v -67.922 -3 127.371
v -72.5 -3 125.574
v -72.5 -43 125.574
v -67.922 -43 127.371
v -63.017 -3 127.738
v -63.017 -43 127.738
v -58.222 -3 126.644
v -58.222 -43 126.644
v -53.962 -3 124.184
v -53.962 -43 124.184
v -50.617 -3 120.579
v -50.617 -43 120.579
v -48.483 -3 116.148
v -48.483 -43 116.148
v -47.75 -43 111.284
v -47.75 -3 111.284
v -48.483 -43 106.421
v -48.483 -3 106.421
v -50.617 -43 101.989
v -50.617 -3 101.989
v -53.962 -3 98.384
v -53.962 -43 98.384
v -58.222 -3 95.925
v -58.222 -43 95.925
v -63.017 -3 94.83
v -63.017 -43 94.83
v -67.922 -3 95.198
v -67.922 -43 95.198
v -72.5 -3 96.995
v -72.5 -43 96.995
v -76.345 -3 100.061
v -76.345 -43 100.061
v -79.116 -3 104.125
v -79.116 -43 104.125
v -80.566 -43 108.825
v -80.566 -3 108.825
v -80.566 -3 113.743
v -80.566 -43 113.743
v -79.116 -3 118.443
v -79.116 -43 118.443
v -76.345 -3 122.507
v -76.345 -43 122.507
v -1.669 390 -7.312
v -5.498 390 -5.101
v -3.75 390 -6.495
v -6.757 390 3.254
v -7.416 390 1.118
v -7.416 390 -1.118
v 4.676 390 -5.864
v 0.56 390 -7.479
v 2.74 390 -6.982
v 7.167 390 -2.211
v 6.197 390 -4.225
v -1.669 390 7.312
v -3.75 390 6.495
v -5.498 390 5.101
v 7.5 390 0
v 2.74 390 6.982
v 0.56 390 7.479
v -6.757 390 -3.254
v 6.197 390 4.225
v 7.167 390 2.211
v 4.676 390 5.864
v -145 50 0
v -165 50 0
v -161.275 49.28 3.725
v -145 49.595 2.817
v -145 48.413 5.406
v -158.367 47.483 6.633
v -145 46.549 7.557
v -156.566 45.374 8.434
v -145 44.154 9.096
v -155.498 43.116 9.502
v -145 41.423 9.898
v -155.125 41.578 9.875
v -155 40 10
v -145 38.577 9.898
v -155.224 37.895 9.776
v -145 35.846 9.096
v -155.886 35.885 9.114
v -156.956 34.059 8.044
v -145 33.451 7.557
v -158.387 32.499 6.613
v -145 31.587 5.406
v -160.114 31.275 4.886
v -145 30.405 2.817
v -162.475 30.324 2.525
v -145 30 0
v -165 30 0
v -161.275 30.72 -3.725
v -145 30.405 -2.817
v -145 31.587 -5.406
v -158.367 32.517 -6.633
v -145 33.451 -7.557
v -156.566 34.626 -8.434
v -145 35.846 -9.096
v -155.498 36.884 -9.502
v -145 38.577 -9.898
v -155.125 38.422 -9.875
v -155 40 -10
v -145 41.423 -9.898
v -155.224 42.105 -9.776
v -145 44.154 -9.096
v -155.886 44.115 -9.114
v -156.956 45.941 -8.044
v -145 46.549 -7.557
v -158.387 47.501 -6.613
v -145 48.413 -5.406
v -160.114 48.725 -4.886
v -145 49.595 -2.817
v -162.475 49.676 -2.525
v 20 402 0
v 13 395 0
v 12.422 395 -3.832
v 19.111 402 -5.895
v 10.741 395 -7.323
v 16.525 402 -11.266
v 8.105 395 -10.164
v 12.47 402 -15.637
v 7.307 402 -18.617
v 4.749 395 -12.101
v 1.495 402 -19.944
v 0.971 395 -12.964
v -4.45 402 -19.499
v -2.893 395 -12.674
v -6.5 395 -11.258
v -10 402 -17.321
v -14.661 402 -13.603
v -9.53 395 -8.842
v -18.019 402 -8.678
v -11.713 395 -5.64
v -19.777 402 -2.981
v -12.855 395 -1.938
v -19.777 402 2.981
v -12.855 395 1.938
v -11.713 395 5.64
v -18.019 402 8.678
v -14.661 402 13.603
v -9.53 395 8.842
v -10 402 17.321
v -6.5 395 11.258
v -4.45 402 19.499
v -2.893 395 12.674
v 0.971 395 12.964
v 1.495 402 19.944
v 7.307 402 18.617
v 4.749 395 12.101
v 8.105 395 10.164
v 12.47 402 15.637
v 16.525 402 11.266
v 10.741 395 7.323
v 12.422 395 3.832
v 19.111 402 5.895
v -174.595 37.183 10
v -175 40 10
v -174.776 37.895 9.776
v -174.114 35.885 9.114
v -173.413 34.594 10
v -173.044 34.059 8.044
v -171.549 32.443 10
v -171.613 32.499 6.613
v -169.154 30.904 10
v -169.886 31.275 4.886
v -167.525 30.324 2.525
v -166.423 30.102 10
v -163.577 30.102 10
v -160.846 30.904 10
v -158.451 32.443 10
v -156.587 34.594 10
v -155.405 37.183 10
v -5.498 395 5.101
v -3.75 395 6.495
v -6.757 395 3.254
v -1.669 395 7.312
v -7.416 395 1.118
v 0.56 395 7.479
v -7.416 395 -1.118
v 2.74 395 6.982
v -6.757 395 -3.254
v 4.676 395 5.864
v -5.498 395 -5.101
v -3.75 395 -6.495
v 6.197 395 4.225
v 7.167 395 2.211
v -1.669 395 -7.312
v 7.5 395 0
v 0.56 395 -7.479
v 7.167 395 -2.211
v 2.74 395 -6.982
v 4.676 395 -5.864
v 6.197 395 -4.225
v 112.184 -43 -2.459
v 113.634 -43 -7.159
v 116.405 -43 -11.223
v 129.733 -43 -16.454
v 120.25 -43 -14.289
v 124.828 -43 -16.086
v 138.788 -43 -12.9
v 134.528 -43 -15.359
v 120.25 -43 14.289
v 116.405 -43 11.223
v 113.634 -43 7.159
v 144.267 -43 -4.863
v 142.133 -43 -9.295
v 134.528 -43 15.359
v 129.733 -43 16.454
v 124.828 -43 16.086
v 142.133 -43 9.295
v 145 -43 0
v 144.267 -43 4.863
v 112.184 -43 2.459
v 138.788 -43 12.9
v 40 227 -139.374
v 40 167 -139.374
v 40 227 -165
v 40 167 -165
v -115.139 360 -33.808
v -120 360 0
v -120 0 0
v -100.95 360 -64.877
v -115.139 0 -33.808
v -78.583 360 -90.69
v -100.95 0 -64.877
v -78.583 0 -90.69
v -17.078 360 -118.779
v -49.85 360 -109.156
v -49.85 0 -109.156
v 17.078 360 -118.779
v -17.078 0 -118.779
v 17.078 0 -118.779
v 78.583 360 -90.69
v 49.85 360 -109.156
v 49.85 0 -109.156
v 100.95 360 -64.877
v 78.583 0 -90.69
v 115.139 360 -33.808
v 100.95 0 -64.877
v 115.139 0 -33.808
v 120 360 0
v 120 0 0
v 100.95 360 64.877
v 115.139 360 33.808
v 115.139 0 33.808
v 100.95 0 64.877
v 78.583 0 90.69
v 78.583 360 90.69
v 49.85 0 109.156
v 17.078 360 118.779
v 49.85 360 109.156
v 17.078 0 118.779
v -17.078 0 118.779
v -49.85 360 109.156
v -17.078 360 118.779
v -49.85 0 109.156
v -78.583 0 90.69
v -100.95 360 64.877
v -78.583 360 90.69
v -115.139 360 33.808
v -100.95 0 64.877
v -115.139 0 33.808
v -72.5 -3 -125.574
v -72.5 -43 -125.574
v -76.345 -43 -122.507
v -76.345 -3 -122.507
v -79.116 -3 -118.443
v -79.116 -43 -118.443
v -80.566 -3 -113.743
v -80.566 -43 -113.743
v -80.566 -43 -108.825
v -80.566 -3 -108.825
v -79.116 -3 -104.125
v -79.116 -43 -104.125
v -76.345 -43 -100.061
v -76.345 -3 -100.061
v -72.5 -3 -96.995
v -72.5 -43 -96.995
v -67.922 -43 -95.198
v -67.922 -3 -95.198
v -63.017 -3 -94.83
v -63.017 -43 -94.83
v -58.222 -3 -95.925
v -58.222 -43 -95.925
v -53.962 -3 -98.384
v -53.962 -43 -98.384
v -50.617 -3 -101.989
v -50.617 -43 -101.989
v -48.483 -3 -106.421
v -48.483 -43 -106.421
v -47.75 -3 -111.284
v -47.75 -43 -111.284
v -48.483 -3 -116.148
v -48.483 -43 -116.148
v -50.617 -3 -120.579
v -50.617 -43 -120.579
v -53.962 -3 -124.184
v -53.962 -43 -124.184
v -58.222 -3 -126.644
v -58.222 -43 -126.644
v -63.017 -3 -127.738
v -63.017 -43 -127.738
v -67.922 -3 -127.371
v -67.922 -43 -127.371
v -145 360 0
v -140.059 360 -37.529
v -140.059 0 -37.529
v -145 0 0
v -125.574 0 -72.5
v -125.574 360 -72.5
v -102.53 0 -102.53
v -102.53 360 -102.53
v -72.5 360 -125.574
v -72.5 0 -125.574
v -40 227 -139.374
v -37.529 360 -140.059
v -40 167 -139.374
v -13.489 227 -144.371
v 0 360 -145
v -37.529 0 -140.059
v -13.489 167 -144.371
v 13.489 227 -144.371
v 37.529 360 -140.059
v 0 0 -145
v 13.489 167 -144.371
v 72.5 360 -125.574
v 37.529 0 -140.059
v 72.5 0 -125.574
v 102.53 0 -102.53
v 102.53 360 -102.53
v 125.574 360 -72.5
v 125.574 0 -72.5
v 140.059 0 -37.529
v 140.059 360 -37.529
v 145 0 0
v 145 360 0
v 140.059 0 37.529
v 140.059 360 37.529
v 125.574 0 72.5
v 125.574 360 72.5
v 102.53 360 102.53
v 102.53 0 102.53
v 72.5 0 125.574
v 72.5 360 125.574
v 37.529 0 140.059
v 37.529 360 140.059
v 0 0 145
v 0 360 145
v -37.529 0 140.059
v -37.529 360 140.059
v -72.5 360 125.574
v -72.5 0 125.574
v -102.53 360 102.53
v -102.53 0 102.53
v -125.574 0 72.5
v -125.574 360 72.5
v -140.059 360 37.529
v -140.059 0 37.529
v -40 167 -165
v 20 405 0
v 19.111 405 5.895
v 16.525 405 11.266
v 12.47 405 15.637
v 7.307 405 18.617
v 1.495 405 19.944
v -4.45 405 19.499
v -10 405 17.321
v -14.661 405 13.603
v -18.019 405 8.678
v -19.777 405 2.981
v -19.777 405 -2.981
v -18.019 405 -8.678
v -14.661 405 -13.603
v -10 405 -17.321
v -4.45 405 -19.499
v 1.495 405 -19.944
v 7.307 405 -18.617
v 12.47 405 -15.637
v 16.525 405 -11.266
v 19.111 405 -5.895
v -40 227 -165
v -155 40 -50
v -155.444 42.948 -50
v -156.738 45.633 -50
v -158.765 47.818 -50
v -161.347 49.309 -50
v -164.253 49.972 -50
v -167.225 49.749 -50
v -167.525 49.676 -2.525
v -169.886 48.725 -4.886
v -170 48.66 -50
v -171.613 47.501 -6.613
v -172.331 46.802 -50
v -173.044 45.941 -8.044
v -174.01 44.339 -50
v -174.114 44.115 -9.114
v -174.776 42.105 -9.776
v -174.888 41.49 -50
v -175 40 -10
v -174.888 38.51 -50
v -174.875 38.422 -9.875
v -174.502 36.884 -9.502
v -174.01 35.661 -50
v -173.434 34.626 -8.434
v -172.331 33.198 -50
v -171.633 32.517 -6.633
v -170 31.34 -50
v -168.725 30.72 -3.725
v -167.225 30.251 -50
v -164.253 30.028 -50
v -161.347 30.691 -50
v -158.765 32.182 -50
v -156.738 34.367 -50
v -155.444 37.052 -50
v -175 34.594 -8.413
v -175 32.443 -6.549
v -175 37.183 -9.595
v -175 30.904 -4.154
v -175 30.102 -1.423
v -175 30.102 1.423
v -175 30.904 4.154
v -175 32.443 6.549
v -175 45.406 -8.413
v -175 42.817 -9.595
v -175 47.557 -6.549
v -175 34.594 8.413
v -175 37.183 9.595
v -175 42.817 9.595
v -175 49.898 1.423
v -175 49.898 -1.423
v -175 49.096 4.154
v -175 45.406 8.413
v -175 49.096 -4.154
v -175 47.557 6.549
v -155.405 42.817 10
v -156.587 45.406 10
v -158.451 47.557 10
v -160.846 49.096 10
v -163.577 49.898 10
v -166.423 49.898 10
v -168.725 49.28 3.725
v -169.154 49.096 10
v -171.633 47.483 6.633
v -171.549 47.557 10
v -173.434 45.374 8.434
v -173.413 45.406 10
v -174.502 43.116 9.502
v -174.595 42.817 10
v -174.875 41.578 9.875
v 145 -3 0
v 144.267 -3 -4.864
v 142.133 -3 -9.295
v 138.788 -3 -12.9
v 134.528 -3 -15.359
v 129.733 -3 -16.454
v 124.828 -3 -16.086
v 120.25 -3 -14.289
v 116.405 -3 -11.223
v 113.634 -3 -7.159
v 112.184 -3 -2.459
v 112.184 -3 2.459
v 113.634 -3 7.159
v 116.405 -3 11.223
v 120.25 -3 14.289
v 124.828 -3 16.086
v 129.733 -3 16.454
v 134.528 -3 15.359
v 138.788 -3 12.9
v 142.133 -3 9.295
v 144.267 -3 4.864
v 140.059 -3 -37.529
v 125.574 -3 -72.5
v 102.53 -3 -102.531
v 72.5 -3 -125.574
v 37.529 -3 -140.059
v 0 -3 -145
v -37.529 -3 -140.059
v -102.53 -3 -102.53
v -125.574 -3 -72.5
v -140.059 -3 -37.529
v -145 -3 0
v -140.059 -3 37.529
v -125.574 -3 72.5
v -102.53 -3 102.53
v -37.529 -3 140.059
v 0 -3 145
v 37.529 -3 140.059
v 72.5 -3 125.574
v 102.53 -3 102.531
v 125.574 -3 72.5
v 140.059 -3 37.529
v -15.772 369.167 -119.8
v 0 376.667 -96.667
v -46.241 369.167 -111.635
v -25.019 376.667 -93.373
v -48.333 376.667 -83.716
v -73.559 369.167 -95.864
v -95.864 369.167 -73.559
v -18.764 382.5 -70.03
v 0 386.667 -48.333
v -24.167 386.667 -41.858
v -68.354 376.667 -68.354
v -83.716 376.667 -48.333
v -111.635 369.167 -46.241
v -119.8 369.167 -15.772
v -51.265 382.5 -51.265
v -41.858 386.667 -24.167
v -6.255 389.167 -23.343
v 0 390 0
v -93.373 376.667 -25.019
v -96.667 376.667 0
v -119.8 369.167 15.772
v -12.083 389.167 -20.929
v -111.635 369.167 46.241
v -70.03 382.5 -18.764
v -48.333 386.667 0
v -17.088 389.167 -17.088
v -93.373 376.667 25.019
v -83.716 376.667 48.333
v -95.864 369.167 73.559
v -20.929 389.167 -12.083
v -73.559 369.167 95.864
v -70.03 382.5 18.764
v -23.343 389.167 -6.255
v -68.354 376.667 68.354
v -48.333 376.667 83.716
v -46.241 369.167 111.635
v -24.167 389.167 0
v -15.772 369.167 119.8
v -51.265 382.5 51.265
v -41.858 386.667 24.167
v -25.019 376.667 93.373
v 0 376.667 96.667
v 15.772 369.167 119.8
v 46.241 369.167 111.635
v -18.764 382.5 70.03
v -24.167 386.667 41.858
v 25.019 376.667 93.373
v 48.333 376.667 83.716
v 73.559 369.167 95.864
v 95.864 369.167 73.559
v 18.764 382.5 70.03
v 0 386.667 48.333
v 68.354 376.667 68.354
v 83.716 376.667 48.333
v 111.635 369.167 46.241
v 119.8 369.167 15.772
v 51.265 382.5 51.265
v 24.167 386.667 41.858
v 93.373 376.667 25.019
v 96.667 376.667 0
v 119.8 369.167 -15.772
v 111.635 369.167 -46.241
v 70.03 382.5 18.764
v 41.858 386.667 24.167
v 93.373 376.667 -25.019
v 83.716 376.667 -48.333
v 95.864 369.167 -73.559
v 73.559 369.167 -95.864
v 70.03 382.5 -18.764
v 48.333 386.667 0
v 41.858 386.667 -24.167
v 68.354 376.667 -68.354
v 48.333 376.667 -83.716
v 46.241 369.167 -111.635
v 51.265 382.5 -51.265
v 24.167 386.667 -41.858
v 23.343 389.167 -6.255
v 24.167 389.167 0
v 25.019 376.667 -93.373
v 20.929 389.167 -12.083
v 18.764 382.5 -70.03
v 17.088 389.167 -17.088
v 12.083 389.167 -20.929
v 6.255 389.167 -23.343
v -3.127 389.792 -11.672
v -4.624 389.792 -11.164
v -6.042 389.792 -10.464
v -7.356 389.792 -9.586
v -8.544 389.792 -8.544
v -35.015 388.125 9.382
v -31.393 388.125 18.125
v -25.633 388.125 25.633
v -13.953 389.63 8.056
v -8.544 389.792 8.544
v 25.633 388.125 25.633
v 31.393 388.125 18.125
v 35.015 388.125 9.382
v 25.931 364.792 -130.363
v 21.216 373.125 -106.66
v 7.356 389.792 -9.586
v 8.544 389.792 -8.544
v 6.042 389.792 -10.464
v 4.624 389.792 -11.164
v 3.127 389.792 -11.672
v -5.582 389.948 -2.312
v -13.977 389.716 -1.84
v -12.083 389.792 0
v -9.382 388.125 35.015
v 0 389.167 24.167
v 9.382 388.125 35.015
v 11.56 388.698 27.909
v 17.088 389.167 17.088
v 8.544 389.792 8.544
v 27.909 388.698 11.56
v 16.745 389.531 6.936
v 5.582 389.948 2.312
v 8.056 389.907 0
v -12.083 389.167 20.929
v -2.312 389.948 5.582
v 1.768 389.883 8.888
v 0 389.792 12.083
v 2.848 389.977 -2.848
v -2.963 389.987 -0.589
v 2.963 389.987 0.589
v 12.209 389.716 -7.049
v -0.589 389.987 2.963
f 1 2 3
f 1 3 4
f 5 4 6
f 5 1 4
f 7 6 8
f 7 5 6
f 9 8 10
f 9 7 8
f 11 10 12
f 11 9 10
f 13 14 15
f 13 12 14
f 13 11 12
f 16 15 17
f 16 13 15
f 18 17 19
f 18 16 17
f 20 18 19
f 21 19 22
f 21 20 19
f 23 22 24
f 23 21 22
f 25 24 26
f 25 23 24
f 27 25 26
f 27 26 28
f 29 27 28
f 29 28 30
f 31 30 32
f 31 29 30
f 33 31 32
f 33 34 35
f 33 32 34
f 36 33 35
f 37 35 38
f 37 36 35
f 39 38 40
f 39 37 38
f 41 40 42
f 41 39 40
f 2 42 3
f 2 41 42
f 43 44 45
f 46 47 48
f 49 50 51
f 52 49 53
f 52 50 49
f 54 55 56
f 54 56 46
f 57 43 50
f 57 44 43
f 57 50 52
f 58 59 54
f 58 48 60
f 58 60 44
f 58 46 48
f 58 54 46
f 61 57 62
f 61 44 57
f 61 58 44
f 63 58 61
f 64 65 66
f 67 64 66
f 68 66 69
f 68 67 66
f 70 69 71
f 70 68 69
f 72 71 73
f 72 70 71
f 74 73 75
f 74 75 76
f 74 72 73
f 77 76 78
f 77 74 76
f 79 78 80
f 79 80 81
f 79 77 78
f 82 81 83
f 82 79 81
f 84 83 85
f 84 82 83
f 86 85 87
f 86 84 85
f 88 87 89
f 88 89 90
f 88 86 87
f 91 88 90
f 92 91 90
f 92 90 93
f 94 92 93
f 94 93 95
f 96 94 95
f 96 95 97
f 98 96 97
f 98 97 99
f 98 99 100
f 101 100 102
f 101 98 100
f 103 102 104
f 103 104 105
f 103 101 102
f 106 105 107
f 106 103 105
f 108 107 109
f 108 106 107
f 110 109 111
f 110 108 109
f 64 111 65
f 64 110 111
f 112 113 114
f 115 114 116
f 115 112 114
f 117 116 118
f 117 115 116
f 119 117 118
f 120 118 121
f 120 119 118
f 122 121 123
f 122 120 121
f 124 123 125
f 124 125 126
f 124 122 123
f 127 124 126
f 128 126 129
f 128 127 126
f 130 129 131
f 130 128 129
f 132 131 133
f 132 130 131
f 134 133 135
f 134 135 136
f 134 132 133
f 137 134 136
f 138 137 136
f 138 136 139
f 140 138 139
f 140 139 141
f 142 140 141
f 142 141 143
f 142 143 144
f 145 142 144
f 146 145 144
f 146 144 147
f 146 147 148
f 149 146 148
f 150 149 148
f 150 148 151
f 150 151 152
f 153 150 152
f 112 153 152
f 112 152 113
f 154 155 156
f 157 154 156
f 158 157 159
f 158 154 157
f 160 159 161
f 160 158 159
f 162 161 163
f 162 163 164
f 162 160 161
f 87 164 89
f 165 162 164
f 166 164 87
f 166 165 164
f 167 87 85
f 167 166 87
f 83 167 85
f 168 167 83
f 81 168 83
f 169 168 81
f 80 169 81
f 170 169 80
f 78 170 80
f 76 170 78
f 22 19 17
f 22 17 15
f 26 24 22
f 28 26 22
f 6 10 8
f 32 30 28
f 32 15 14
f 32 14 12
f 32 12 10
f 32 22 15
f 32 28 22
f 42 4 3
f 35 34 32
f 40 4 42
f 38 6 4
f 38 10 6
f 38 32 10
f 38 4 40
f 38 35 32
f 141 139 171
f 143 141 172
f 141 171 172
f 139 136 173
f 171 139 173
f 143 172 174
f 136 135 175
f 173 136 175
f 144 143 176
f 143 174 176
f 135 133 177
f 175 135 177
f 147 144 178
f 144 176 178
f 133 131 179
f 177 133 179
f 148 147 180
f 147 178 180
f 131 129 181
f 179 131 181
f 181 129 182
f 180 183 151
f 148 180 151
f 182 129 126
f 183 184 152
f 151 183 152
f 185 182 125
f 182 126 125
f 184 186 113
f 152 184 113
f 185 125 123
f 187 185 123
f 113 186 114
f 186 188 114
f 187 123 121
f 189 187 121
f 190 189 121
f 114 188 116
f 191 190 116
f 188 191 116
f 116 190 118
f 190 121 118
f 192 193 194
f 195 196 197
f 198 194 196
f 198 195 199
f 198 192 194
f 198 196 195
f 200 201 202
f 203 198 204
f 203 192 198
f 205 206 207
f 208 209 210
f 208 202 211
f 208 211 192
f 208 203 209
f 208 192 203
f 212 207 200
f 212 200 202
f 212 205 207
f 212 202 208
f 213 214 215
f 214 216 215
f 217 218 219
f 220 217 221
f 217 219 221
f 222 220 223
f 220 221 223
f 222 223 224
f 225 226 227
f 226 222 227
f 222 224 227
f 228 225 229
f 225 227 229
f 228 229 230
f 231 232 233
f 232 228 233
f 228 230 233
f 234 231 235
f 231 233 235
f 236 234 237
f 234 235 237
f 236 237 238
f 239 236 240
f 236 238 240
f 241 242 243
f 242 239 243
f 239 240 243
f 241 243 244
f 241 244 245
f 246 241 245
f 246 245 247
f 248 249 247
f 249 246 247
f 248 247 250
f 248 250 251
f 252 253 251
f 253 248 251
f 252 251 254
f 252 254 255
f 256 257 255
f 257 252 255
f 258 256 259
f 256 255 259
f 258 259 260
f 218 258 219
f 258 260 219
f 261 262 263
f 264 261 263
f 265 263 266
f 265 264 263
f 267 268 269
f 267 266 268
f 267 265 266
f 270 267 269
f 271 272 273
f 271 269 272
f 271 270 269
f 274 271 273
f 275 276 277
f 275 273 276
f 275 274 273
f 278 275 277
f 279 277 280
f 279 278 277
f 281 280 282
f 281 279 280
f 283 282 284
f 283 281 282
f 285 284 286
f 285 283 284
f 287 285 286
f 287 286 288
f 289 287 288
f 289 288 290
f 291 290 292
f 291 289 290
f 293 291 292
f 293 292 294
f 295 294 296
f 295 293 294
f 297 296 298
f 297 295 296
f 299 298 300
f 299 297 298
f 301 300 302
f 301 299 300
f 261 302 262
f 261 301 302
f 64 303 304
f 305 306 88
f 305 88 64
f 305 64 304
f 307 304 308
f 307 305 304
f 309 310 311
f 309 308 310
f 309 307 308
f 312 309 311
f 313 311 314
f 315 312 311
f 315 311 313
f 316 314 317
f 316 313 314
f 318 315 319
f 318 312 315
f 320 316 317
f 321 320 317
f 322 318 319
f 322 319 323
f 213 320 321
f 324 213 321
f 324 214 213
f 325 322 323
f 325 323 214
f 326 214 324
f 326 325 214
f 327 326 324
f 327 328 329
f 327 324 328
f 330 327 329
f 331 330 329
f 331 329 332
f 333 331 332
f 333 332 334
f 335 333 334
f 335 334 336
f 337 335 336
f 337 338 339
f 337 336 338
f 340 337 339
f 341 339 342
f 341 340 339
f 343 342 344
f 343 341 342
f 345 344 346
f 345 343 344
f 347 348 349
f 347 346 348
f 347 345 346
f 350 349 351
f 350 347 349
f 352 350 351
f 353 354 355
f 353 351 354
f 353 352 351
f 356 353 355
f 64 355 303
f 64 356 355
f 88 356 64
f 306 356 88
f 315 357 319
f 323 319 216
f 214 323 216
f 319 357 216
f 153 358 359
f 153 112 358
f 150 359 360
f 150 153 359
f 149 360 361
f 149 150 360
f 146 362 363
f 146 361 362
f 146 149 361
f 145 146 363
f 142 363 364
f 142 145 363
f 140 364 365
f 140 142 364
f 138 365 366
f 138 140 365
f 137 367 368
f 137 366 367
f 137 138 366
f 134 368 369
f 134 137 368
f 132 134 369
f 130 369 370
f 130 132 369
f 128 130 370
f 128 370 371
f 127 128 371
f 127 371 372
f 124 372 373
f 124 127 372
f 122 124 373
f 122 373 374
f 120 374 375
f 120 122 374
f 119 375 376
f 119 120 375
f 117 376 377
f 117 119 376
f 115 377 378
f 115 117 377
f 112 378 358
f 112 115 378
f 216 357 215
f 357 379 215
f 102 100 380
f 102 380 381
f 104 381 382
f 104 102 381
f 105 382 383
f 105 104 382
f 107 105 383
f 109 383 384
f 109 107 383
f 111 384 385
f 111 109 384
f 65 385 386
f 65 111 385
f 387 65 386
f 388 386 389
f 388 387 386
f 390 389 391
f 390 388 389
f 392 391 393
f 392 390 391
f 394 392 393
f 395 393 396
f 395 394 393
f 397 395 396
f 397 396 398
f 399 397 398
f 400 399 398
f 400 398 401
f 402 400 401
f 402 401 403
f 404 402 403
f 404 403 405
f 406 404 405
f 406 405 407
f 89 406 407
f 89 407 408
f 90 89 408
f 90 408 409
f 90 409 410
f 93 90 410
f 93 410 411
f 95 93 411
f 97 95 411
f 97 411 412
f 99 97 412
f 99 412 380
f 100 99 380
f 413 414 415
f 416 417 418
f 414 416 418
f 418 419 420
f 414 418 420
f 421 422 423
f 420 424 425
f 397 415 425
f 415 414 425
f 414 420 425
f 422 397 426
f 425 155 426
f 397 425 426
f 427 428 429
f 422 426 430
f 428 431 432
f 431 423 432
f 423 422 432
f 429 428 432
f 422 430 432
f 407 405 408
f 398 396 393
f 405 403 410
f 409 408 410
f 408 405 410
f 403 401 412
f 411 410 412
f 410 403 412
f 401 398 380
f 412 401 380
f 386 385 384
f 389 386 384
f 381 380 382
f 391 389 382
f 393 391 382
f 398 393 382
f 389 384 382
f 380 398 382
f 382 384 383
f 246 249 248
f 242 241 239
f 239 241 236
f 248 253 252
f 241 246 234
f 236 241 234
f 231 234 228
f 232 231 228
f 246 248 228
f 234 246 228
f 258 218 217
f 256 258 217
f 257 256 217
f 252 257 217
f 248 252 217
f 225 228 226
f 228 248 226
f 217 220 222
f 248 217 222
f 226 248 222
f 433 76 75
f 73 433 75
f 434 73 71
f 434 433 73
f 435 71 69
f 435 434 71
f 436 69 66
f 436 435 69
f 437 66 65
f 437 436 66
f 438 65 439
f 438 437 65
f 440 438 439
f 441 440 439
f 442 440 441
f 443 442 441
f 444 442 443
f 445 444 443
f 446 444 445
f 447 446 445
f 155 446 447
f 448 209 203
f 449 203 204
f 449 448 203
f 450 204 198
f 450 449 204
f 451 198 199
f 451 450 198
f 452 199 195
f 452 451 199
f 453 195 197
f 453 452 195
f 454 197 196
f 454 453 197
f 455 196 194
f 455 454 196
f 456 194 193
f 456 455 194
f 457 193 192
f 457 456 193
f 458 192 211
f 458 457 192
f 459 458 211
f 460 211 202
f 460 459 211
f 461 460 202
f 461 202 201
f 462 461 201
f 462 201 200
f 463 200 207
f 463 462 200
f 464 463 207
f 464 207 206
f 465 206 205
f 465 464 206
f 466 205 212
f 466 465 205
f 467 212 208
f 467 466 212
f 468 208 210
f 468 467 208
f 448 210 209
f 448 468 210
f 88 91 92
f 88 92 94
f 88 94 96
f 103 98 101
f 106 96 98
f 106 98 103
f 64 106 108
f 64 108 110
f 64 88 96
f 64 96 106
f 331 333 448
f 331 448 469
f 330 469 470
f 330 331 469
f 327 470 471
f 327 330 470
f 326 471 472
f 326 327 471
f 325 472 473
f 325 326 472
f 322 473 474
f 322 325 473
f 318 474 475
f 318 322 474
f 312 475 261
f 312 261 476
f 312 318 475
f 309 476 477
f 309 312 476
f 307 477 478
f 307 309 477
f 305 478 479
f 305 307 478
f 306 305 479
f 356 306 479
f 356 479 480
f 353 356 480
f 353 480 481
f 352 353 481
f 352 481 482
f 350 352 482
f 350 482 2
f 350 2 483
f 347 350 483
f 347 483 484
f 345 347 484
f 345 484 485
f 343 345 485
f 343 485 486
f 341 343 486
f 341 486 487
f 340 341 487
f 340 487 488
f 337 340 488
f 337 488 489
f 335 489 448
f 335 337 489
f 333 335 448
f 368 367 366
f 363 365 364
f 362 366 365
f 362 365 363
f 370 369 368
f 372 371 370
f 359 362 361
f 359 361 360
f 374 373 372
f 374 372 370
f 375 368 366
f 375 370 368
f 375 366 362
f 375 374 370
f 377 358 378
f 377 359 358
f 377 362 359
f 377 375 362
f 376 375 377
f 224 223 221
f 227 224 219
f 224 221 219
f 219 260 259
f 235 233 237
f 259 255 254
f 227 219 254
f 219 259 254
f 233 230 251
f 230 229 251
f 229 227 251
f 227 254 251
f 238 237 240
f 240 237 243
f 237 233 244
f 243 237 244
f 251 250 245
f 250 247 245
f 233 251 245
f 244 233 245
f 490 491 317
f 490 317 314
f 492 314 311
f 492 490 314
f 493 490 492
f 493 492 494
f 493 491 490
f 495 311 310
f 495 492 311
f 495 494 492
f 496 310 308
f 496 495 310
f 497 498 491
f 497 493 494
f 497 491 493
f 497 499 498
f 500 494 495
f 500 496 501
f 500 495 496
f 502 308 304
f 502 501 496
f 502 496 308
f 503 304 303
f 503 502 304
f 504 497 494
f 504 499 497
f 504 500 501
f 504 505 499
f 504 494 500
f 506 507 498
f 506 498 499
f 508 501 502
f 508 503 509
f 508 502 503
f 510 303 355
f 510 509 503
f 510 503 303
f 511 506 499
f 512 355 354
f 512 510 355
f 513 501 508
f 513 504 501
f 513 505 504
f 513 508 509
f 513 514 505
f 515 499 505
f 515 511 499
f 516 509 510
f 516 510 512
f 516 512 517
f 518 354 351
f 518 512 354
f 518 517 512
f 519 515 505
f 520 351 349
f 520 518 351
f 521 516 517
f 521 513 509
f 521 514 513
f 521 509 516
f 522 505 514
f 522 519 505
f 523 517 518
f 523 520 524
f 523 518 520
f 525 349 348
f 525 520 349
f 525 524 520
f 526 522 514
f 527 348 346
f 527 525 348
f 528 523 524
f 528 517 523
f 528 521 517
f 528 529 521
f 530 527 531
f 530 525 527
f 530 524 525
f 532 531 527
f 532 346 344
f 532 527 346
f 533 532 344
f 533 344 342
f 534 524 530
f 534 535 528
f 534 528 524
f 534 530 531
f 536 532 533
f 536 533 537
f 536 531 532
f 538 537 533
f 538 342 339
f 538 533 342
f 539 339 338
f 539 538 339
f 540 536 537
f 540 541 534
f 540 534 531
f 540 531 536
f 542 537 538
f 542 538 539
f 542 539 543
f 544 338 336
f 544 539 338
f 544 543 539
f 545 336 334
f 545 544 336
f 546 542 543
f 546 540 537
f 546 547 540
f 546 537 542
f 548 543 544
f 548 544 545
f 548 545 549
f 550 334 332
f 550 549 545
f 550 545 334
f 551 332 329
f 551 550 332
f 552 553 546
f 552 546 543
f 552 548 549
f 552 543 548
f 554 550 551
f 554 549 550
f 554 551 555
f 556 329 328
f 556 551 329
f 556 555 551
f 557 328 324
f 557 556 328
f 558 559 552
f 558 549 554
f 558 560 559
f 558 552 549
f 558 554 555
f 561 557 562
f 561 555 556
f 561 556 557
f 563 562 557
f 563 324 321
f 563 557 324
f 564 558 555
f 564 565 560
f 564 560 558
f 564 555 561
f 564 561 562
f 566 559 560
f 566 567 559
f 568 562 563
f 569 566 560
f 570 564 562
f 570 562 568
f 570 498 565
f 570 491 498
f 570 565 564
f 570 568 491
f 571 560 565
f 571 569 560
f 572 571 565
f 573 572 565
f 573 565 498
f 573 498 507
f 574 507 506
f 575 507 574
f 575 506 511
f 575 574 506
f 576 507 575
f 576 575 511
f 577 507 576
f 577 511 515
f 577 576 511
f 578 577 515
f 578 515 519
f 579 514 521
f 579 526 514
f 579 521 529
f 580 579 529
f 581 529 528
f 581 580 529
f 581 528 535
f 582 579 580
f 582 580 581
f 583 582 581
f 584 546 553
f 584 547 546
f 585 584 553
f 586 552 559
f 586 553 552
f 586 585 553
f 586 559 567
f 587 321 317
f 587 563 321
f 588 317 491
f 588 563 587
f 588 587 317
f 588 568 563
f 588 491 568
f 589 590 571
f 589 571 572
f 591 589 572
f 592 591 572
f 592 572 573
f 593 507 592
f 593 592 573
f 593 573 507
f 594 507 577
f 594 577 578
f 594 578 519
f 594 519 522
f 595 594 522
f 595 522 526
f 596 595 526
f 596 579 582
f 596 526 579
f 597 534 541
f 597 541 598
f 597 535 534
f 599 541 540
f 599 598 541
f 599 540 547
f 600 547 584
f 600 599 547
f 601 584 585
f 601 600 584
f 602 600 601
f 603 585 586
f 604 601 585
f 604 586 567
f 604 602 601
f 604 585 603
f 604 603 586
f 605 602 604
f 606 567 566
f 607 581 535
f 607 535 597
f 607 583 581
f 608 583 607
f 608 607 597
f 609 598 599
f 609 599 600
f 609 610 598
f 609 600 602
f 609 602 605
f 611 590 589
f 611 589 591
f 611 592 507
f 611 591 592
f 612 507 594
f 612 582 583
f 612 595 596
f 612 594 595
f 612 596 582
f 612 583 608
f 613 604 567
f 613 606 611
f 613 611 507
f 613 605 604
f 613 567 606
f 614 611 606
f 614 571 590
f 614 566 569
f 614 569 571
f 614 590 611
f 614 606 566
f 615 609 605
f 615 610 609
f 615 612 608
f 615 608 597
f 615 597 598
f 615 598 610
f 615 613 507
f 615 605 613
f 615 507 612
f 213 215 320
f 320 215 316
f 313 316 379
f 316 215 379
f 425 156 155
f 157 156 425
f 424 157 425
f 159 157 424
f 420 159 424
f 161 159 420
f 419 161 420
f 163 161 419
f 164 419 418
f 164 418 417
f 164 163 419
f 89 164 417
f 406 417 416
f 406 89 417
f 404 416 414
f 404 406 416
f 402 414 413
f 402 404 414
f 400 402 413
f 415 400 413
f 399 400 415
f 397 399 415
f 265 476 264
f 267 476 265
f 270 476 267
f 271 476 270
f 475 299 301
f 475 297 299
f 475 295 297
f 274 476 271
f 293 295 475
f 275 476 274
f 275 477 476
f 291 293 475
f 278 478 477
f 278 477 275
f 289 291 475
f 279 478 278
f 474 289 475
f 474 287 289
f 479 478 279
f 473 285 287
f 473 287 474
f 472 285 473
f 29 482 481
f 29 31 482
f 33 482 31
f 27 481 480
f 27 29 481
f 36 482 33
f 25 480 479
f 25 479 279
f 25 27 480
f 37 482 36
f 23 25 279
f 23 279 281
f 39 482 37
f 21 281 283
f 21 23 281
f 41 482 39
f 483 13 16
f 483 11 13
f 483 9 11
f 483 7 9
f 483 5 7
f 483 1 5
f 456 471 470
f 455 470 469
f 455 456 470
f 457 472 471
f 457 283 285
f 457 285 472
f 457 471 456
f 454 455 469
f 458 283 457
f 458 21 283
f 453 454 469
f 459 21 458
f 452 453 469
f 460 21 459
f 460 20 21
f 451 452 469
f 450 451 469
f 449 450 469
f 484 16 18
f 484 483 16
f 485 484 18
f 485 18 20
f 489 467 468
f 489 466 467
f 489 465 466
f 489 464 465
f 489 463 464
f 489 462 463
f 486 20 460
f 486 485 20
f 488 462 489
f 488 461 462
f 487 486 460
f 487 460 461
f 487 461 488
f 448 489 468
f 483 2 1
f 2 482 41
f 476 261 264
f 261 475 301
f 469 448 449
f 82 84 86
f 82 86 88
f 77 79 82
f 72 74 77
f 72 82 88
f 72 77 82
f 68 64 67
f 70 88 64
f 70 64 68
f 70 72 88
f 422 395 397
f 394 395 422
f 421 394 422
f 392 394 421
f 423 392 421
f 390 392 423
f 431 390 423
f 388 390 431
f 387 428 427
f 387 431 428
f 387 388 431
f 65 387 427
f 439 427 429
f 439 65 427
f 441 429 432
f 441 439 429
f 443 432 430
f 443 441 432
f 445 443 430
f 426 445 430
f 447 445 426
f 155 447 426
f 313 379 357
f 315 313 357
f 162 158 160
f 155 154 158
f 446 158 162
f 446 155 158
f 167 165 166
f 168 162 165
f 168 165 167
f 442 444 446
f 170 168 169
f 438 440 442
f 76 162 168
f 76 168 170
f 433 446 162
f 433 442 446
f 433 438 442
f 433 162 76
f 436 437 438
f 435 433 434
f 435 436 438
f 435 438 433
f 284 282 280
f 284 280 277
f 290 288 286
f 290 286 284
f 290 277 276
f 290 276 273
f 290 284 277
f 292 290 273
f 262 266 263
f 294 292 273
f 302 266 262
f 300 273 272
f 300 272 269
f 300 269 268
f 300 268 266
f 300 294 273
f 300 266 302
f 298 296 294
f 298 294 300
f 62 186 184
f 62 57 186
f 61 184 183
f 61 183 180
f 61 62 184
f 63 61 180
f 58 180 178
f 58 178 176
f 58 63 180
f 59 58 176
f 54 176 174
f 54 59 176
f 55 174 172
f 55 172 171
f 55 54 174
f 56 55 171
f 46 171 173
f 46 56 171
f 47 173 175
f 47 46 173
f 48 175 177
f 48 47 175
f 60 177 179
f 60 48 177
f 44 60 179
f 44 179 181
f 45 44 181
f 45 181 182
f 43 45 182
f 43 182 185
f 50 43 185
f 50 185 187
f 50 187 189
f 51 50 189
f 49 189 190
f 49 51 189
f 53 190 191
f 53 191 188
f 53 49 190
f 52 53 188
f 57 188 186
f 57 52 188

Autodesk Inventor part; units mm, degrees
sketch "Sketch1" plane through (0, 0, 0) normal (0, 1, 0) x (-1, 0, 0)
  circle A0 centre (0, 0) radius 145
  circle A1 centre (0, 0) radius 120
  dimension "d0" = 290
  dimension "d1" = 240
extrude "Extrusion1" add sketch "Sketch1" along normal blind 360
sketch "Sketch2" plane through (0, 0, 0) normal (0, -1, 0) x (1, 0, 0)
  circle A0 centre (0, 0) radius 145
extrude "Extrusion2" add sketch "Sketch2" along normal blind 3
sketch "Sketch3" plane through (0, -3, 0) normal (0, -1, 0) x (1, 0, 0)
  circle A0 centre (0, 0) radius 145 projected
  circle A1 centre (128.5, 0) radius 16.5
  circle A2 centre (0, 0) radius 145 projected
  dimension "d6" = 33
extrude "Extrusion3" add sketch "Sketch3" along normal blind 40 contours A1
pattern_circular "Circular Pattern1" count 3 over 360 about axis through (0, -10, 0) along (0, 1, 0) of "Extrusion3"
sketch "Sketch4" plane through (0, 0, 0) normal (1, 0, 0) x (0, 1, 0)
  line L0 (360, -145) -> (360, 145) projected
  line L1 (360, 0) -> (390, 0)
  line L2 (360, -145) -> (360, 0)
  spline S0 degree 2 poles (360, -145) (390, -72.5) (390, 0) knots 0 0 0 0.5 0.5 0.5
  line L3 (390, -28.8222) -> (390, 28.8222) construction
  arc A0 (389.2438, -23.008) -> (389.2438, 23.008) centre (39.5833, 0) ccw construction
  line L4 (-131.127, 0) -> (485.762, 0) projected
  point P0 (0, 0)
  dimension "d13" = 30
revolve "Revolution1" add sketch "Sketch4" angle 360 about axis through (0, -10, 0) along (0, 1, 0)
ref_plane "Work Plane2" through (0, 390, 0) normal (0, -1, 0) x (1, 0, 0)
sketch "Sketch5" plane through (0, 390, 0) normal (0, -1, 0) x (1, 0, 0)
  point P0 (0, 0)
sketch "Sketch6" plane through (0, 390, 0) normal (0, -1, 0) x (1, 0, 0)
  circle A0 centre (0, 0) radius 7.5
  dimension "d15" = 15
extrude "Extrusion4" add sketch "Sketch6" against normal blind 5
sketch "Sketch7" plane through (0, 395, 0) normal (0, 1, 0) x (1, 0, 0)
  circle A0 centre (0, 0) radius 7.5 projected
  circle A1 centre (0, 0) radius 20
  dimension "d18" = 40
extrude "Extrusion5" add sketch "Sketch7" along normal blind 10 contours A0 | A1
chamfer "Chamfer1" distance 7 angle 45 1 edges at (-20, 395, 0)
ref_plane "Work Plane3" through (-145, 0, 0) normal (1, 0, 0) x (0, 1, 0)
sketch "Sketch8" plane through (-145, 0, 0) normal (1, 0, 0) x (0, 1, 0)
  line L0 (0, 0) -> (40, 0) construction
  circle A0 centre (40, 0) radius 10
  dimension "d24" = 40
  dimension "d25" = 20
extrude "Extrusion6" add sketch "Sketch8" against normal blind 30
ref_plane "Work Plane4" through (-145, 40, 10) normal (0, 0, 1) x (1, 0, 0)
sketch "Sketch11" plane through (-145, 40, 10) normal (0, 0, 1) x (1, 0, 0)
  circle A0 centre (-20, 0) radius 10
  line L0 (0, 10) -> (-30, 10) projected
  line L1 (-30, 10) -> (-30, -10) projected
  point P0 (145, -40)
extrude "Extrusion8" add sketch "Sketch11" against normal blind 60 contours A0
ref_plane "Work Plane5" through (0, 0, -145) normal (0, 0, 1) x (1, 0, 0)
sketch "Sketch12" plane through (0, 0, -145) normal (0, 0, 1) x (1, 0, 0)
  line L0 (-40, 167) -> (40, 167)
  line L1 (40, 167) -> (40, 227)
  line L2 (40, 227) -> (-40, 227)
  line L3 (-40, 227) -> (-40, 167)
  line L4 (-40, 167) -> (40, 227) construction
  line L5 (40, 167) -> (-40, 227) construction
  line L6 (-72.5, -3) -> (145, -3) projected
  point P0 (0, 0)
  point P1 (0, 197)
  dimension "d33" = 80
  dimension "d34" = 60
  dimension "d35" = 200
extrude "Extrusion9" add sketch "Sketch12" along normal mid plane 40
properties part number "LauteringTun"
